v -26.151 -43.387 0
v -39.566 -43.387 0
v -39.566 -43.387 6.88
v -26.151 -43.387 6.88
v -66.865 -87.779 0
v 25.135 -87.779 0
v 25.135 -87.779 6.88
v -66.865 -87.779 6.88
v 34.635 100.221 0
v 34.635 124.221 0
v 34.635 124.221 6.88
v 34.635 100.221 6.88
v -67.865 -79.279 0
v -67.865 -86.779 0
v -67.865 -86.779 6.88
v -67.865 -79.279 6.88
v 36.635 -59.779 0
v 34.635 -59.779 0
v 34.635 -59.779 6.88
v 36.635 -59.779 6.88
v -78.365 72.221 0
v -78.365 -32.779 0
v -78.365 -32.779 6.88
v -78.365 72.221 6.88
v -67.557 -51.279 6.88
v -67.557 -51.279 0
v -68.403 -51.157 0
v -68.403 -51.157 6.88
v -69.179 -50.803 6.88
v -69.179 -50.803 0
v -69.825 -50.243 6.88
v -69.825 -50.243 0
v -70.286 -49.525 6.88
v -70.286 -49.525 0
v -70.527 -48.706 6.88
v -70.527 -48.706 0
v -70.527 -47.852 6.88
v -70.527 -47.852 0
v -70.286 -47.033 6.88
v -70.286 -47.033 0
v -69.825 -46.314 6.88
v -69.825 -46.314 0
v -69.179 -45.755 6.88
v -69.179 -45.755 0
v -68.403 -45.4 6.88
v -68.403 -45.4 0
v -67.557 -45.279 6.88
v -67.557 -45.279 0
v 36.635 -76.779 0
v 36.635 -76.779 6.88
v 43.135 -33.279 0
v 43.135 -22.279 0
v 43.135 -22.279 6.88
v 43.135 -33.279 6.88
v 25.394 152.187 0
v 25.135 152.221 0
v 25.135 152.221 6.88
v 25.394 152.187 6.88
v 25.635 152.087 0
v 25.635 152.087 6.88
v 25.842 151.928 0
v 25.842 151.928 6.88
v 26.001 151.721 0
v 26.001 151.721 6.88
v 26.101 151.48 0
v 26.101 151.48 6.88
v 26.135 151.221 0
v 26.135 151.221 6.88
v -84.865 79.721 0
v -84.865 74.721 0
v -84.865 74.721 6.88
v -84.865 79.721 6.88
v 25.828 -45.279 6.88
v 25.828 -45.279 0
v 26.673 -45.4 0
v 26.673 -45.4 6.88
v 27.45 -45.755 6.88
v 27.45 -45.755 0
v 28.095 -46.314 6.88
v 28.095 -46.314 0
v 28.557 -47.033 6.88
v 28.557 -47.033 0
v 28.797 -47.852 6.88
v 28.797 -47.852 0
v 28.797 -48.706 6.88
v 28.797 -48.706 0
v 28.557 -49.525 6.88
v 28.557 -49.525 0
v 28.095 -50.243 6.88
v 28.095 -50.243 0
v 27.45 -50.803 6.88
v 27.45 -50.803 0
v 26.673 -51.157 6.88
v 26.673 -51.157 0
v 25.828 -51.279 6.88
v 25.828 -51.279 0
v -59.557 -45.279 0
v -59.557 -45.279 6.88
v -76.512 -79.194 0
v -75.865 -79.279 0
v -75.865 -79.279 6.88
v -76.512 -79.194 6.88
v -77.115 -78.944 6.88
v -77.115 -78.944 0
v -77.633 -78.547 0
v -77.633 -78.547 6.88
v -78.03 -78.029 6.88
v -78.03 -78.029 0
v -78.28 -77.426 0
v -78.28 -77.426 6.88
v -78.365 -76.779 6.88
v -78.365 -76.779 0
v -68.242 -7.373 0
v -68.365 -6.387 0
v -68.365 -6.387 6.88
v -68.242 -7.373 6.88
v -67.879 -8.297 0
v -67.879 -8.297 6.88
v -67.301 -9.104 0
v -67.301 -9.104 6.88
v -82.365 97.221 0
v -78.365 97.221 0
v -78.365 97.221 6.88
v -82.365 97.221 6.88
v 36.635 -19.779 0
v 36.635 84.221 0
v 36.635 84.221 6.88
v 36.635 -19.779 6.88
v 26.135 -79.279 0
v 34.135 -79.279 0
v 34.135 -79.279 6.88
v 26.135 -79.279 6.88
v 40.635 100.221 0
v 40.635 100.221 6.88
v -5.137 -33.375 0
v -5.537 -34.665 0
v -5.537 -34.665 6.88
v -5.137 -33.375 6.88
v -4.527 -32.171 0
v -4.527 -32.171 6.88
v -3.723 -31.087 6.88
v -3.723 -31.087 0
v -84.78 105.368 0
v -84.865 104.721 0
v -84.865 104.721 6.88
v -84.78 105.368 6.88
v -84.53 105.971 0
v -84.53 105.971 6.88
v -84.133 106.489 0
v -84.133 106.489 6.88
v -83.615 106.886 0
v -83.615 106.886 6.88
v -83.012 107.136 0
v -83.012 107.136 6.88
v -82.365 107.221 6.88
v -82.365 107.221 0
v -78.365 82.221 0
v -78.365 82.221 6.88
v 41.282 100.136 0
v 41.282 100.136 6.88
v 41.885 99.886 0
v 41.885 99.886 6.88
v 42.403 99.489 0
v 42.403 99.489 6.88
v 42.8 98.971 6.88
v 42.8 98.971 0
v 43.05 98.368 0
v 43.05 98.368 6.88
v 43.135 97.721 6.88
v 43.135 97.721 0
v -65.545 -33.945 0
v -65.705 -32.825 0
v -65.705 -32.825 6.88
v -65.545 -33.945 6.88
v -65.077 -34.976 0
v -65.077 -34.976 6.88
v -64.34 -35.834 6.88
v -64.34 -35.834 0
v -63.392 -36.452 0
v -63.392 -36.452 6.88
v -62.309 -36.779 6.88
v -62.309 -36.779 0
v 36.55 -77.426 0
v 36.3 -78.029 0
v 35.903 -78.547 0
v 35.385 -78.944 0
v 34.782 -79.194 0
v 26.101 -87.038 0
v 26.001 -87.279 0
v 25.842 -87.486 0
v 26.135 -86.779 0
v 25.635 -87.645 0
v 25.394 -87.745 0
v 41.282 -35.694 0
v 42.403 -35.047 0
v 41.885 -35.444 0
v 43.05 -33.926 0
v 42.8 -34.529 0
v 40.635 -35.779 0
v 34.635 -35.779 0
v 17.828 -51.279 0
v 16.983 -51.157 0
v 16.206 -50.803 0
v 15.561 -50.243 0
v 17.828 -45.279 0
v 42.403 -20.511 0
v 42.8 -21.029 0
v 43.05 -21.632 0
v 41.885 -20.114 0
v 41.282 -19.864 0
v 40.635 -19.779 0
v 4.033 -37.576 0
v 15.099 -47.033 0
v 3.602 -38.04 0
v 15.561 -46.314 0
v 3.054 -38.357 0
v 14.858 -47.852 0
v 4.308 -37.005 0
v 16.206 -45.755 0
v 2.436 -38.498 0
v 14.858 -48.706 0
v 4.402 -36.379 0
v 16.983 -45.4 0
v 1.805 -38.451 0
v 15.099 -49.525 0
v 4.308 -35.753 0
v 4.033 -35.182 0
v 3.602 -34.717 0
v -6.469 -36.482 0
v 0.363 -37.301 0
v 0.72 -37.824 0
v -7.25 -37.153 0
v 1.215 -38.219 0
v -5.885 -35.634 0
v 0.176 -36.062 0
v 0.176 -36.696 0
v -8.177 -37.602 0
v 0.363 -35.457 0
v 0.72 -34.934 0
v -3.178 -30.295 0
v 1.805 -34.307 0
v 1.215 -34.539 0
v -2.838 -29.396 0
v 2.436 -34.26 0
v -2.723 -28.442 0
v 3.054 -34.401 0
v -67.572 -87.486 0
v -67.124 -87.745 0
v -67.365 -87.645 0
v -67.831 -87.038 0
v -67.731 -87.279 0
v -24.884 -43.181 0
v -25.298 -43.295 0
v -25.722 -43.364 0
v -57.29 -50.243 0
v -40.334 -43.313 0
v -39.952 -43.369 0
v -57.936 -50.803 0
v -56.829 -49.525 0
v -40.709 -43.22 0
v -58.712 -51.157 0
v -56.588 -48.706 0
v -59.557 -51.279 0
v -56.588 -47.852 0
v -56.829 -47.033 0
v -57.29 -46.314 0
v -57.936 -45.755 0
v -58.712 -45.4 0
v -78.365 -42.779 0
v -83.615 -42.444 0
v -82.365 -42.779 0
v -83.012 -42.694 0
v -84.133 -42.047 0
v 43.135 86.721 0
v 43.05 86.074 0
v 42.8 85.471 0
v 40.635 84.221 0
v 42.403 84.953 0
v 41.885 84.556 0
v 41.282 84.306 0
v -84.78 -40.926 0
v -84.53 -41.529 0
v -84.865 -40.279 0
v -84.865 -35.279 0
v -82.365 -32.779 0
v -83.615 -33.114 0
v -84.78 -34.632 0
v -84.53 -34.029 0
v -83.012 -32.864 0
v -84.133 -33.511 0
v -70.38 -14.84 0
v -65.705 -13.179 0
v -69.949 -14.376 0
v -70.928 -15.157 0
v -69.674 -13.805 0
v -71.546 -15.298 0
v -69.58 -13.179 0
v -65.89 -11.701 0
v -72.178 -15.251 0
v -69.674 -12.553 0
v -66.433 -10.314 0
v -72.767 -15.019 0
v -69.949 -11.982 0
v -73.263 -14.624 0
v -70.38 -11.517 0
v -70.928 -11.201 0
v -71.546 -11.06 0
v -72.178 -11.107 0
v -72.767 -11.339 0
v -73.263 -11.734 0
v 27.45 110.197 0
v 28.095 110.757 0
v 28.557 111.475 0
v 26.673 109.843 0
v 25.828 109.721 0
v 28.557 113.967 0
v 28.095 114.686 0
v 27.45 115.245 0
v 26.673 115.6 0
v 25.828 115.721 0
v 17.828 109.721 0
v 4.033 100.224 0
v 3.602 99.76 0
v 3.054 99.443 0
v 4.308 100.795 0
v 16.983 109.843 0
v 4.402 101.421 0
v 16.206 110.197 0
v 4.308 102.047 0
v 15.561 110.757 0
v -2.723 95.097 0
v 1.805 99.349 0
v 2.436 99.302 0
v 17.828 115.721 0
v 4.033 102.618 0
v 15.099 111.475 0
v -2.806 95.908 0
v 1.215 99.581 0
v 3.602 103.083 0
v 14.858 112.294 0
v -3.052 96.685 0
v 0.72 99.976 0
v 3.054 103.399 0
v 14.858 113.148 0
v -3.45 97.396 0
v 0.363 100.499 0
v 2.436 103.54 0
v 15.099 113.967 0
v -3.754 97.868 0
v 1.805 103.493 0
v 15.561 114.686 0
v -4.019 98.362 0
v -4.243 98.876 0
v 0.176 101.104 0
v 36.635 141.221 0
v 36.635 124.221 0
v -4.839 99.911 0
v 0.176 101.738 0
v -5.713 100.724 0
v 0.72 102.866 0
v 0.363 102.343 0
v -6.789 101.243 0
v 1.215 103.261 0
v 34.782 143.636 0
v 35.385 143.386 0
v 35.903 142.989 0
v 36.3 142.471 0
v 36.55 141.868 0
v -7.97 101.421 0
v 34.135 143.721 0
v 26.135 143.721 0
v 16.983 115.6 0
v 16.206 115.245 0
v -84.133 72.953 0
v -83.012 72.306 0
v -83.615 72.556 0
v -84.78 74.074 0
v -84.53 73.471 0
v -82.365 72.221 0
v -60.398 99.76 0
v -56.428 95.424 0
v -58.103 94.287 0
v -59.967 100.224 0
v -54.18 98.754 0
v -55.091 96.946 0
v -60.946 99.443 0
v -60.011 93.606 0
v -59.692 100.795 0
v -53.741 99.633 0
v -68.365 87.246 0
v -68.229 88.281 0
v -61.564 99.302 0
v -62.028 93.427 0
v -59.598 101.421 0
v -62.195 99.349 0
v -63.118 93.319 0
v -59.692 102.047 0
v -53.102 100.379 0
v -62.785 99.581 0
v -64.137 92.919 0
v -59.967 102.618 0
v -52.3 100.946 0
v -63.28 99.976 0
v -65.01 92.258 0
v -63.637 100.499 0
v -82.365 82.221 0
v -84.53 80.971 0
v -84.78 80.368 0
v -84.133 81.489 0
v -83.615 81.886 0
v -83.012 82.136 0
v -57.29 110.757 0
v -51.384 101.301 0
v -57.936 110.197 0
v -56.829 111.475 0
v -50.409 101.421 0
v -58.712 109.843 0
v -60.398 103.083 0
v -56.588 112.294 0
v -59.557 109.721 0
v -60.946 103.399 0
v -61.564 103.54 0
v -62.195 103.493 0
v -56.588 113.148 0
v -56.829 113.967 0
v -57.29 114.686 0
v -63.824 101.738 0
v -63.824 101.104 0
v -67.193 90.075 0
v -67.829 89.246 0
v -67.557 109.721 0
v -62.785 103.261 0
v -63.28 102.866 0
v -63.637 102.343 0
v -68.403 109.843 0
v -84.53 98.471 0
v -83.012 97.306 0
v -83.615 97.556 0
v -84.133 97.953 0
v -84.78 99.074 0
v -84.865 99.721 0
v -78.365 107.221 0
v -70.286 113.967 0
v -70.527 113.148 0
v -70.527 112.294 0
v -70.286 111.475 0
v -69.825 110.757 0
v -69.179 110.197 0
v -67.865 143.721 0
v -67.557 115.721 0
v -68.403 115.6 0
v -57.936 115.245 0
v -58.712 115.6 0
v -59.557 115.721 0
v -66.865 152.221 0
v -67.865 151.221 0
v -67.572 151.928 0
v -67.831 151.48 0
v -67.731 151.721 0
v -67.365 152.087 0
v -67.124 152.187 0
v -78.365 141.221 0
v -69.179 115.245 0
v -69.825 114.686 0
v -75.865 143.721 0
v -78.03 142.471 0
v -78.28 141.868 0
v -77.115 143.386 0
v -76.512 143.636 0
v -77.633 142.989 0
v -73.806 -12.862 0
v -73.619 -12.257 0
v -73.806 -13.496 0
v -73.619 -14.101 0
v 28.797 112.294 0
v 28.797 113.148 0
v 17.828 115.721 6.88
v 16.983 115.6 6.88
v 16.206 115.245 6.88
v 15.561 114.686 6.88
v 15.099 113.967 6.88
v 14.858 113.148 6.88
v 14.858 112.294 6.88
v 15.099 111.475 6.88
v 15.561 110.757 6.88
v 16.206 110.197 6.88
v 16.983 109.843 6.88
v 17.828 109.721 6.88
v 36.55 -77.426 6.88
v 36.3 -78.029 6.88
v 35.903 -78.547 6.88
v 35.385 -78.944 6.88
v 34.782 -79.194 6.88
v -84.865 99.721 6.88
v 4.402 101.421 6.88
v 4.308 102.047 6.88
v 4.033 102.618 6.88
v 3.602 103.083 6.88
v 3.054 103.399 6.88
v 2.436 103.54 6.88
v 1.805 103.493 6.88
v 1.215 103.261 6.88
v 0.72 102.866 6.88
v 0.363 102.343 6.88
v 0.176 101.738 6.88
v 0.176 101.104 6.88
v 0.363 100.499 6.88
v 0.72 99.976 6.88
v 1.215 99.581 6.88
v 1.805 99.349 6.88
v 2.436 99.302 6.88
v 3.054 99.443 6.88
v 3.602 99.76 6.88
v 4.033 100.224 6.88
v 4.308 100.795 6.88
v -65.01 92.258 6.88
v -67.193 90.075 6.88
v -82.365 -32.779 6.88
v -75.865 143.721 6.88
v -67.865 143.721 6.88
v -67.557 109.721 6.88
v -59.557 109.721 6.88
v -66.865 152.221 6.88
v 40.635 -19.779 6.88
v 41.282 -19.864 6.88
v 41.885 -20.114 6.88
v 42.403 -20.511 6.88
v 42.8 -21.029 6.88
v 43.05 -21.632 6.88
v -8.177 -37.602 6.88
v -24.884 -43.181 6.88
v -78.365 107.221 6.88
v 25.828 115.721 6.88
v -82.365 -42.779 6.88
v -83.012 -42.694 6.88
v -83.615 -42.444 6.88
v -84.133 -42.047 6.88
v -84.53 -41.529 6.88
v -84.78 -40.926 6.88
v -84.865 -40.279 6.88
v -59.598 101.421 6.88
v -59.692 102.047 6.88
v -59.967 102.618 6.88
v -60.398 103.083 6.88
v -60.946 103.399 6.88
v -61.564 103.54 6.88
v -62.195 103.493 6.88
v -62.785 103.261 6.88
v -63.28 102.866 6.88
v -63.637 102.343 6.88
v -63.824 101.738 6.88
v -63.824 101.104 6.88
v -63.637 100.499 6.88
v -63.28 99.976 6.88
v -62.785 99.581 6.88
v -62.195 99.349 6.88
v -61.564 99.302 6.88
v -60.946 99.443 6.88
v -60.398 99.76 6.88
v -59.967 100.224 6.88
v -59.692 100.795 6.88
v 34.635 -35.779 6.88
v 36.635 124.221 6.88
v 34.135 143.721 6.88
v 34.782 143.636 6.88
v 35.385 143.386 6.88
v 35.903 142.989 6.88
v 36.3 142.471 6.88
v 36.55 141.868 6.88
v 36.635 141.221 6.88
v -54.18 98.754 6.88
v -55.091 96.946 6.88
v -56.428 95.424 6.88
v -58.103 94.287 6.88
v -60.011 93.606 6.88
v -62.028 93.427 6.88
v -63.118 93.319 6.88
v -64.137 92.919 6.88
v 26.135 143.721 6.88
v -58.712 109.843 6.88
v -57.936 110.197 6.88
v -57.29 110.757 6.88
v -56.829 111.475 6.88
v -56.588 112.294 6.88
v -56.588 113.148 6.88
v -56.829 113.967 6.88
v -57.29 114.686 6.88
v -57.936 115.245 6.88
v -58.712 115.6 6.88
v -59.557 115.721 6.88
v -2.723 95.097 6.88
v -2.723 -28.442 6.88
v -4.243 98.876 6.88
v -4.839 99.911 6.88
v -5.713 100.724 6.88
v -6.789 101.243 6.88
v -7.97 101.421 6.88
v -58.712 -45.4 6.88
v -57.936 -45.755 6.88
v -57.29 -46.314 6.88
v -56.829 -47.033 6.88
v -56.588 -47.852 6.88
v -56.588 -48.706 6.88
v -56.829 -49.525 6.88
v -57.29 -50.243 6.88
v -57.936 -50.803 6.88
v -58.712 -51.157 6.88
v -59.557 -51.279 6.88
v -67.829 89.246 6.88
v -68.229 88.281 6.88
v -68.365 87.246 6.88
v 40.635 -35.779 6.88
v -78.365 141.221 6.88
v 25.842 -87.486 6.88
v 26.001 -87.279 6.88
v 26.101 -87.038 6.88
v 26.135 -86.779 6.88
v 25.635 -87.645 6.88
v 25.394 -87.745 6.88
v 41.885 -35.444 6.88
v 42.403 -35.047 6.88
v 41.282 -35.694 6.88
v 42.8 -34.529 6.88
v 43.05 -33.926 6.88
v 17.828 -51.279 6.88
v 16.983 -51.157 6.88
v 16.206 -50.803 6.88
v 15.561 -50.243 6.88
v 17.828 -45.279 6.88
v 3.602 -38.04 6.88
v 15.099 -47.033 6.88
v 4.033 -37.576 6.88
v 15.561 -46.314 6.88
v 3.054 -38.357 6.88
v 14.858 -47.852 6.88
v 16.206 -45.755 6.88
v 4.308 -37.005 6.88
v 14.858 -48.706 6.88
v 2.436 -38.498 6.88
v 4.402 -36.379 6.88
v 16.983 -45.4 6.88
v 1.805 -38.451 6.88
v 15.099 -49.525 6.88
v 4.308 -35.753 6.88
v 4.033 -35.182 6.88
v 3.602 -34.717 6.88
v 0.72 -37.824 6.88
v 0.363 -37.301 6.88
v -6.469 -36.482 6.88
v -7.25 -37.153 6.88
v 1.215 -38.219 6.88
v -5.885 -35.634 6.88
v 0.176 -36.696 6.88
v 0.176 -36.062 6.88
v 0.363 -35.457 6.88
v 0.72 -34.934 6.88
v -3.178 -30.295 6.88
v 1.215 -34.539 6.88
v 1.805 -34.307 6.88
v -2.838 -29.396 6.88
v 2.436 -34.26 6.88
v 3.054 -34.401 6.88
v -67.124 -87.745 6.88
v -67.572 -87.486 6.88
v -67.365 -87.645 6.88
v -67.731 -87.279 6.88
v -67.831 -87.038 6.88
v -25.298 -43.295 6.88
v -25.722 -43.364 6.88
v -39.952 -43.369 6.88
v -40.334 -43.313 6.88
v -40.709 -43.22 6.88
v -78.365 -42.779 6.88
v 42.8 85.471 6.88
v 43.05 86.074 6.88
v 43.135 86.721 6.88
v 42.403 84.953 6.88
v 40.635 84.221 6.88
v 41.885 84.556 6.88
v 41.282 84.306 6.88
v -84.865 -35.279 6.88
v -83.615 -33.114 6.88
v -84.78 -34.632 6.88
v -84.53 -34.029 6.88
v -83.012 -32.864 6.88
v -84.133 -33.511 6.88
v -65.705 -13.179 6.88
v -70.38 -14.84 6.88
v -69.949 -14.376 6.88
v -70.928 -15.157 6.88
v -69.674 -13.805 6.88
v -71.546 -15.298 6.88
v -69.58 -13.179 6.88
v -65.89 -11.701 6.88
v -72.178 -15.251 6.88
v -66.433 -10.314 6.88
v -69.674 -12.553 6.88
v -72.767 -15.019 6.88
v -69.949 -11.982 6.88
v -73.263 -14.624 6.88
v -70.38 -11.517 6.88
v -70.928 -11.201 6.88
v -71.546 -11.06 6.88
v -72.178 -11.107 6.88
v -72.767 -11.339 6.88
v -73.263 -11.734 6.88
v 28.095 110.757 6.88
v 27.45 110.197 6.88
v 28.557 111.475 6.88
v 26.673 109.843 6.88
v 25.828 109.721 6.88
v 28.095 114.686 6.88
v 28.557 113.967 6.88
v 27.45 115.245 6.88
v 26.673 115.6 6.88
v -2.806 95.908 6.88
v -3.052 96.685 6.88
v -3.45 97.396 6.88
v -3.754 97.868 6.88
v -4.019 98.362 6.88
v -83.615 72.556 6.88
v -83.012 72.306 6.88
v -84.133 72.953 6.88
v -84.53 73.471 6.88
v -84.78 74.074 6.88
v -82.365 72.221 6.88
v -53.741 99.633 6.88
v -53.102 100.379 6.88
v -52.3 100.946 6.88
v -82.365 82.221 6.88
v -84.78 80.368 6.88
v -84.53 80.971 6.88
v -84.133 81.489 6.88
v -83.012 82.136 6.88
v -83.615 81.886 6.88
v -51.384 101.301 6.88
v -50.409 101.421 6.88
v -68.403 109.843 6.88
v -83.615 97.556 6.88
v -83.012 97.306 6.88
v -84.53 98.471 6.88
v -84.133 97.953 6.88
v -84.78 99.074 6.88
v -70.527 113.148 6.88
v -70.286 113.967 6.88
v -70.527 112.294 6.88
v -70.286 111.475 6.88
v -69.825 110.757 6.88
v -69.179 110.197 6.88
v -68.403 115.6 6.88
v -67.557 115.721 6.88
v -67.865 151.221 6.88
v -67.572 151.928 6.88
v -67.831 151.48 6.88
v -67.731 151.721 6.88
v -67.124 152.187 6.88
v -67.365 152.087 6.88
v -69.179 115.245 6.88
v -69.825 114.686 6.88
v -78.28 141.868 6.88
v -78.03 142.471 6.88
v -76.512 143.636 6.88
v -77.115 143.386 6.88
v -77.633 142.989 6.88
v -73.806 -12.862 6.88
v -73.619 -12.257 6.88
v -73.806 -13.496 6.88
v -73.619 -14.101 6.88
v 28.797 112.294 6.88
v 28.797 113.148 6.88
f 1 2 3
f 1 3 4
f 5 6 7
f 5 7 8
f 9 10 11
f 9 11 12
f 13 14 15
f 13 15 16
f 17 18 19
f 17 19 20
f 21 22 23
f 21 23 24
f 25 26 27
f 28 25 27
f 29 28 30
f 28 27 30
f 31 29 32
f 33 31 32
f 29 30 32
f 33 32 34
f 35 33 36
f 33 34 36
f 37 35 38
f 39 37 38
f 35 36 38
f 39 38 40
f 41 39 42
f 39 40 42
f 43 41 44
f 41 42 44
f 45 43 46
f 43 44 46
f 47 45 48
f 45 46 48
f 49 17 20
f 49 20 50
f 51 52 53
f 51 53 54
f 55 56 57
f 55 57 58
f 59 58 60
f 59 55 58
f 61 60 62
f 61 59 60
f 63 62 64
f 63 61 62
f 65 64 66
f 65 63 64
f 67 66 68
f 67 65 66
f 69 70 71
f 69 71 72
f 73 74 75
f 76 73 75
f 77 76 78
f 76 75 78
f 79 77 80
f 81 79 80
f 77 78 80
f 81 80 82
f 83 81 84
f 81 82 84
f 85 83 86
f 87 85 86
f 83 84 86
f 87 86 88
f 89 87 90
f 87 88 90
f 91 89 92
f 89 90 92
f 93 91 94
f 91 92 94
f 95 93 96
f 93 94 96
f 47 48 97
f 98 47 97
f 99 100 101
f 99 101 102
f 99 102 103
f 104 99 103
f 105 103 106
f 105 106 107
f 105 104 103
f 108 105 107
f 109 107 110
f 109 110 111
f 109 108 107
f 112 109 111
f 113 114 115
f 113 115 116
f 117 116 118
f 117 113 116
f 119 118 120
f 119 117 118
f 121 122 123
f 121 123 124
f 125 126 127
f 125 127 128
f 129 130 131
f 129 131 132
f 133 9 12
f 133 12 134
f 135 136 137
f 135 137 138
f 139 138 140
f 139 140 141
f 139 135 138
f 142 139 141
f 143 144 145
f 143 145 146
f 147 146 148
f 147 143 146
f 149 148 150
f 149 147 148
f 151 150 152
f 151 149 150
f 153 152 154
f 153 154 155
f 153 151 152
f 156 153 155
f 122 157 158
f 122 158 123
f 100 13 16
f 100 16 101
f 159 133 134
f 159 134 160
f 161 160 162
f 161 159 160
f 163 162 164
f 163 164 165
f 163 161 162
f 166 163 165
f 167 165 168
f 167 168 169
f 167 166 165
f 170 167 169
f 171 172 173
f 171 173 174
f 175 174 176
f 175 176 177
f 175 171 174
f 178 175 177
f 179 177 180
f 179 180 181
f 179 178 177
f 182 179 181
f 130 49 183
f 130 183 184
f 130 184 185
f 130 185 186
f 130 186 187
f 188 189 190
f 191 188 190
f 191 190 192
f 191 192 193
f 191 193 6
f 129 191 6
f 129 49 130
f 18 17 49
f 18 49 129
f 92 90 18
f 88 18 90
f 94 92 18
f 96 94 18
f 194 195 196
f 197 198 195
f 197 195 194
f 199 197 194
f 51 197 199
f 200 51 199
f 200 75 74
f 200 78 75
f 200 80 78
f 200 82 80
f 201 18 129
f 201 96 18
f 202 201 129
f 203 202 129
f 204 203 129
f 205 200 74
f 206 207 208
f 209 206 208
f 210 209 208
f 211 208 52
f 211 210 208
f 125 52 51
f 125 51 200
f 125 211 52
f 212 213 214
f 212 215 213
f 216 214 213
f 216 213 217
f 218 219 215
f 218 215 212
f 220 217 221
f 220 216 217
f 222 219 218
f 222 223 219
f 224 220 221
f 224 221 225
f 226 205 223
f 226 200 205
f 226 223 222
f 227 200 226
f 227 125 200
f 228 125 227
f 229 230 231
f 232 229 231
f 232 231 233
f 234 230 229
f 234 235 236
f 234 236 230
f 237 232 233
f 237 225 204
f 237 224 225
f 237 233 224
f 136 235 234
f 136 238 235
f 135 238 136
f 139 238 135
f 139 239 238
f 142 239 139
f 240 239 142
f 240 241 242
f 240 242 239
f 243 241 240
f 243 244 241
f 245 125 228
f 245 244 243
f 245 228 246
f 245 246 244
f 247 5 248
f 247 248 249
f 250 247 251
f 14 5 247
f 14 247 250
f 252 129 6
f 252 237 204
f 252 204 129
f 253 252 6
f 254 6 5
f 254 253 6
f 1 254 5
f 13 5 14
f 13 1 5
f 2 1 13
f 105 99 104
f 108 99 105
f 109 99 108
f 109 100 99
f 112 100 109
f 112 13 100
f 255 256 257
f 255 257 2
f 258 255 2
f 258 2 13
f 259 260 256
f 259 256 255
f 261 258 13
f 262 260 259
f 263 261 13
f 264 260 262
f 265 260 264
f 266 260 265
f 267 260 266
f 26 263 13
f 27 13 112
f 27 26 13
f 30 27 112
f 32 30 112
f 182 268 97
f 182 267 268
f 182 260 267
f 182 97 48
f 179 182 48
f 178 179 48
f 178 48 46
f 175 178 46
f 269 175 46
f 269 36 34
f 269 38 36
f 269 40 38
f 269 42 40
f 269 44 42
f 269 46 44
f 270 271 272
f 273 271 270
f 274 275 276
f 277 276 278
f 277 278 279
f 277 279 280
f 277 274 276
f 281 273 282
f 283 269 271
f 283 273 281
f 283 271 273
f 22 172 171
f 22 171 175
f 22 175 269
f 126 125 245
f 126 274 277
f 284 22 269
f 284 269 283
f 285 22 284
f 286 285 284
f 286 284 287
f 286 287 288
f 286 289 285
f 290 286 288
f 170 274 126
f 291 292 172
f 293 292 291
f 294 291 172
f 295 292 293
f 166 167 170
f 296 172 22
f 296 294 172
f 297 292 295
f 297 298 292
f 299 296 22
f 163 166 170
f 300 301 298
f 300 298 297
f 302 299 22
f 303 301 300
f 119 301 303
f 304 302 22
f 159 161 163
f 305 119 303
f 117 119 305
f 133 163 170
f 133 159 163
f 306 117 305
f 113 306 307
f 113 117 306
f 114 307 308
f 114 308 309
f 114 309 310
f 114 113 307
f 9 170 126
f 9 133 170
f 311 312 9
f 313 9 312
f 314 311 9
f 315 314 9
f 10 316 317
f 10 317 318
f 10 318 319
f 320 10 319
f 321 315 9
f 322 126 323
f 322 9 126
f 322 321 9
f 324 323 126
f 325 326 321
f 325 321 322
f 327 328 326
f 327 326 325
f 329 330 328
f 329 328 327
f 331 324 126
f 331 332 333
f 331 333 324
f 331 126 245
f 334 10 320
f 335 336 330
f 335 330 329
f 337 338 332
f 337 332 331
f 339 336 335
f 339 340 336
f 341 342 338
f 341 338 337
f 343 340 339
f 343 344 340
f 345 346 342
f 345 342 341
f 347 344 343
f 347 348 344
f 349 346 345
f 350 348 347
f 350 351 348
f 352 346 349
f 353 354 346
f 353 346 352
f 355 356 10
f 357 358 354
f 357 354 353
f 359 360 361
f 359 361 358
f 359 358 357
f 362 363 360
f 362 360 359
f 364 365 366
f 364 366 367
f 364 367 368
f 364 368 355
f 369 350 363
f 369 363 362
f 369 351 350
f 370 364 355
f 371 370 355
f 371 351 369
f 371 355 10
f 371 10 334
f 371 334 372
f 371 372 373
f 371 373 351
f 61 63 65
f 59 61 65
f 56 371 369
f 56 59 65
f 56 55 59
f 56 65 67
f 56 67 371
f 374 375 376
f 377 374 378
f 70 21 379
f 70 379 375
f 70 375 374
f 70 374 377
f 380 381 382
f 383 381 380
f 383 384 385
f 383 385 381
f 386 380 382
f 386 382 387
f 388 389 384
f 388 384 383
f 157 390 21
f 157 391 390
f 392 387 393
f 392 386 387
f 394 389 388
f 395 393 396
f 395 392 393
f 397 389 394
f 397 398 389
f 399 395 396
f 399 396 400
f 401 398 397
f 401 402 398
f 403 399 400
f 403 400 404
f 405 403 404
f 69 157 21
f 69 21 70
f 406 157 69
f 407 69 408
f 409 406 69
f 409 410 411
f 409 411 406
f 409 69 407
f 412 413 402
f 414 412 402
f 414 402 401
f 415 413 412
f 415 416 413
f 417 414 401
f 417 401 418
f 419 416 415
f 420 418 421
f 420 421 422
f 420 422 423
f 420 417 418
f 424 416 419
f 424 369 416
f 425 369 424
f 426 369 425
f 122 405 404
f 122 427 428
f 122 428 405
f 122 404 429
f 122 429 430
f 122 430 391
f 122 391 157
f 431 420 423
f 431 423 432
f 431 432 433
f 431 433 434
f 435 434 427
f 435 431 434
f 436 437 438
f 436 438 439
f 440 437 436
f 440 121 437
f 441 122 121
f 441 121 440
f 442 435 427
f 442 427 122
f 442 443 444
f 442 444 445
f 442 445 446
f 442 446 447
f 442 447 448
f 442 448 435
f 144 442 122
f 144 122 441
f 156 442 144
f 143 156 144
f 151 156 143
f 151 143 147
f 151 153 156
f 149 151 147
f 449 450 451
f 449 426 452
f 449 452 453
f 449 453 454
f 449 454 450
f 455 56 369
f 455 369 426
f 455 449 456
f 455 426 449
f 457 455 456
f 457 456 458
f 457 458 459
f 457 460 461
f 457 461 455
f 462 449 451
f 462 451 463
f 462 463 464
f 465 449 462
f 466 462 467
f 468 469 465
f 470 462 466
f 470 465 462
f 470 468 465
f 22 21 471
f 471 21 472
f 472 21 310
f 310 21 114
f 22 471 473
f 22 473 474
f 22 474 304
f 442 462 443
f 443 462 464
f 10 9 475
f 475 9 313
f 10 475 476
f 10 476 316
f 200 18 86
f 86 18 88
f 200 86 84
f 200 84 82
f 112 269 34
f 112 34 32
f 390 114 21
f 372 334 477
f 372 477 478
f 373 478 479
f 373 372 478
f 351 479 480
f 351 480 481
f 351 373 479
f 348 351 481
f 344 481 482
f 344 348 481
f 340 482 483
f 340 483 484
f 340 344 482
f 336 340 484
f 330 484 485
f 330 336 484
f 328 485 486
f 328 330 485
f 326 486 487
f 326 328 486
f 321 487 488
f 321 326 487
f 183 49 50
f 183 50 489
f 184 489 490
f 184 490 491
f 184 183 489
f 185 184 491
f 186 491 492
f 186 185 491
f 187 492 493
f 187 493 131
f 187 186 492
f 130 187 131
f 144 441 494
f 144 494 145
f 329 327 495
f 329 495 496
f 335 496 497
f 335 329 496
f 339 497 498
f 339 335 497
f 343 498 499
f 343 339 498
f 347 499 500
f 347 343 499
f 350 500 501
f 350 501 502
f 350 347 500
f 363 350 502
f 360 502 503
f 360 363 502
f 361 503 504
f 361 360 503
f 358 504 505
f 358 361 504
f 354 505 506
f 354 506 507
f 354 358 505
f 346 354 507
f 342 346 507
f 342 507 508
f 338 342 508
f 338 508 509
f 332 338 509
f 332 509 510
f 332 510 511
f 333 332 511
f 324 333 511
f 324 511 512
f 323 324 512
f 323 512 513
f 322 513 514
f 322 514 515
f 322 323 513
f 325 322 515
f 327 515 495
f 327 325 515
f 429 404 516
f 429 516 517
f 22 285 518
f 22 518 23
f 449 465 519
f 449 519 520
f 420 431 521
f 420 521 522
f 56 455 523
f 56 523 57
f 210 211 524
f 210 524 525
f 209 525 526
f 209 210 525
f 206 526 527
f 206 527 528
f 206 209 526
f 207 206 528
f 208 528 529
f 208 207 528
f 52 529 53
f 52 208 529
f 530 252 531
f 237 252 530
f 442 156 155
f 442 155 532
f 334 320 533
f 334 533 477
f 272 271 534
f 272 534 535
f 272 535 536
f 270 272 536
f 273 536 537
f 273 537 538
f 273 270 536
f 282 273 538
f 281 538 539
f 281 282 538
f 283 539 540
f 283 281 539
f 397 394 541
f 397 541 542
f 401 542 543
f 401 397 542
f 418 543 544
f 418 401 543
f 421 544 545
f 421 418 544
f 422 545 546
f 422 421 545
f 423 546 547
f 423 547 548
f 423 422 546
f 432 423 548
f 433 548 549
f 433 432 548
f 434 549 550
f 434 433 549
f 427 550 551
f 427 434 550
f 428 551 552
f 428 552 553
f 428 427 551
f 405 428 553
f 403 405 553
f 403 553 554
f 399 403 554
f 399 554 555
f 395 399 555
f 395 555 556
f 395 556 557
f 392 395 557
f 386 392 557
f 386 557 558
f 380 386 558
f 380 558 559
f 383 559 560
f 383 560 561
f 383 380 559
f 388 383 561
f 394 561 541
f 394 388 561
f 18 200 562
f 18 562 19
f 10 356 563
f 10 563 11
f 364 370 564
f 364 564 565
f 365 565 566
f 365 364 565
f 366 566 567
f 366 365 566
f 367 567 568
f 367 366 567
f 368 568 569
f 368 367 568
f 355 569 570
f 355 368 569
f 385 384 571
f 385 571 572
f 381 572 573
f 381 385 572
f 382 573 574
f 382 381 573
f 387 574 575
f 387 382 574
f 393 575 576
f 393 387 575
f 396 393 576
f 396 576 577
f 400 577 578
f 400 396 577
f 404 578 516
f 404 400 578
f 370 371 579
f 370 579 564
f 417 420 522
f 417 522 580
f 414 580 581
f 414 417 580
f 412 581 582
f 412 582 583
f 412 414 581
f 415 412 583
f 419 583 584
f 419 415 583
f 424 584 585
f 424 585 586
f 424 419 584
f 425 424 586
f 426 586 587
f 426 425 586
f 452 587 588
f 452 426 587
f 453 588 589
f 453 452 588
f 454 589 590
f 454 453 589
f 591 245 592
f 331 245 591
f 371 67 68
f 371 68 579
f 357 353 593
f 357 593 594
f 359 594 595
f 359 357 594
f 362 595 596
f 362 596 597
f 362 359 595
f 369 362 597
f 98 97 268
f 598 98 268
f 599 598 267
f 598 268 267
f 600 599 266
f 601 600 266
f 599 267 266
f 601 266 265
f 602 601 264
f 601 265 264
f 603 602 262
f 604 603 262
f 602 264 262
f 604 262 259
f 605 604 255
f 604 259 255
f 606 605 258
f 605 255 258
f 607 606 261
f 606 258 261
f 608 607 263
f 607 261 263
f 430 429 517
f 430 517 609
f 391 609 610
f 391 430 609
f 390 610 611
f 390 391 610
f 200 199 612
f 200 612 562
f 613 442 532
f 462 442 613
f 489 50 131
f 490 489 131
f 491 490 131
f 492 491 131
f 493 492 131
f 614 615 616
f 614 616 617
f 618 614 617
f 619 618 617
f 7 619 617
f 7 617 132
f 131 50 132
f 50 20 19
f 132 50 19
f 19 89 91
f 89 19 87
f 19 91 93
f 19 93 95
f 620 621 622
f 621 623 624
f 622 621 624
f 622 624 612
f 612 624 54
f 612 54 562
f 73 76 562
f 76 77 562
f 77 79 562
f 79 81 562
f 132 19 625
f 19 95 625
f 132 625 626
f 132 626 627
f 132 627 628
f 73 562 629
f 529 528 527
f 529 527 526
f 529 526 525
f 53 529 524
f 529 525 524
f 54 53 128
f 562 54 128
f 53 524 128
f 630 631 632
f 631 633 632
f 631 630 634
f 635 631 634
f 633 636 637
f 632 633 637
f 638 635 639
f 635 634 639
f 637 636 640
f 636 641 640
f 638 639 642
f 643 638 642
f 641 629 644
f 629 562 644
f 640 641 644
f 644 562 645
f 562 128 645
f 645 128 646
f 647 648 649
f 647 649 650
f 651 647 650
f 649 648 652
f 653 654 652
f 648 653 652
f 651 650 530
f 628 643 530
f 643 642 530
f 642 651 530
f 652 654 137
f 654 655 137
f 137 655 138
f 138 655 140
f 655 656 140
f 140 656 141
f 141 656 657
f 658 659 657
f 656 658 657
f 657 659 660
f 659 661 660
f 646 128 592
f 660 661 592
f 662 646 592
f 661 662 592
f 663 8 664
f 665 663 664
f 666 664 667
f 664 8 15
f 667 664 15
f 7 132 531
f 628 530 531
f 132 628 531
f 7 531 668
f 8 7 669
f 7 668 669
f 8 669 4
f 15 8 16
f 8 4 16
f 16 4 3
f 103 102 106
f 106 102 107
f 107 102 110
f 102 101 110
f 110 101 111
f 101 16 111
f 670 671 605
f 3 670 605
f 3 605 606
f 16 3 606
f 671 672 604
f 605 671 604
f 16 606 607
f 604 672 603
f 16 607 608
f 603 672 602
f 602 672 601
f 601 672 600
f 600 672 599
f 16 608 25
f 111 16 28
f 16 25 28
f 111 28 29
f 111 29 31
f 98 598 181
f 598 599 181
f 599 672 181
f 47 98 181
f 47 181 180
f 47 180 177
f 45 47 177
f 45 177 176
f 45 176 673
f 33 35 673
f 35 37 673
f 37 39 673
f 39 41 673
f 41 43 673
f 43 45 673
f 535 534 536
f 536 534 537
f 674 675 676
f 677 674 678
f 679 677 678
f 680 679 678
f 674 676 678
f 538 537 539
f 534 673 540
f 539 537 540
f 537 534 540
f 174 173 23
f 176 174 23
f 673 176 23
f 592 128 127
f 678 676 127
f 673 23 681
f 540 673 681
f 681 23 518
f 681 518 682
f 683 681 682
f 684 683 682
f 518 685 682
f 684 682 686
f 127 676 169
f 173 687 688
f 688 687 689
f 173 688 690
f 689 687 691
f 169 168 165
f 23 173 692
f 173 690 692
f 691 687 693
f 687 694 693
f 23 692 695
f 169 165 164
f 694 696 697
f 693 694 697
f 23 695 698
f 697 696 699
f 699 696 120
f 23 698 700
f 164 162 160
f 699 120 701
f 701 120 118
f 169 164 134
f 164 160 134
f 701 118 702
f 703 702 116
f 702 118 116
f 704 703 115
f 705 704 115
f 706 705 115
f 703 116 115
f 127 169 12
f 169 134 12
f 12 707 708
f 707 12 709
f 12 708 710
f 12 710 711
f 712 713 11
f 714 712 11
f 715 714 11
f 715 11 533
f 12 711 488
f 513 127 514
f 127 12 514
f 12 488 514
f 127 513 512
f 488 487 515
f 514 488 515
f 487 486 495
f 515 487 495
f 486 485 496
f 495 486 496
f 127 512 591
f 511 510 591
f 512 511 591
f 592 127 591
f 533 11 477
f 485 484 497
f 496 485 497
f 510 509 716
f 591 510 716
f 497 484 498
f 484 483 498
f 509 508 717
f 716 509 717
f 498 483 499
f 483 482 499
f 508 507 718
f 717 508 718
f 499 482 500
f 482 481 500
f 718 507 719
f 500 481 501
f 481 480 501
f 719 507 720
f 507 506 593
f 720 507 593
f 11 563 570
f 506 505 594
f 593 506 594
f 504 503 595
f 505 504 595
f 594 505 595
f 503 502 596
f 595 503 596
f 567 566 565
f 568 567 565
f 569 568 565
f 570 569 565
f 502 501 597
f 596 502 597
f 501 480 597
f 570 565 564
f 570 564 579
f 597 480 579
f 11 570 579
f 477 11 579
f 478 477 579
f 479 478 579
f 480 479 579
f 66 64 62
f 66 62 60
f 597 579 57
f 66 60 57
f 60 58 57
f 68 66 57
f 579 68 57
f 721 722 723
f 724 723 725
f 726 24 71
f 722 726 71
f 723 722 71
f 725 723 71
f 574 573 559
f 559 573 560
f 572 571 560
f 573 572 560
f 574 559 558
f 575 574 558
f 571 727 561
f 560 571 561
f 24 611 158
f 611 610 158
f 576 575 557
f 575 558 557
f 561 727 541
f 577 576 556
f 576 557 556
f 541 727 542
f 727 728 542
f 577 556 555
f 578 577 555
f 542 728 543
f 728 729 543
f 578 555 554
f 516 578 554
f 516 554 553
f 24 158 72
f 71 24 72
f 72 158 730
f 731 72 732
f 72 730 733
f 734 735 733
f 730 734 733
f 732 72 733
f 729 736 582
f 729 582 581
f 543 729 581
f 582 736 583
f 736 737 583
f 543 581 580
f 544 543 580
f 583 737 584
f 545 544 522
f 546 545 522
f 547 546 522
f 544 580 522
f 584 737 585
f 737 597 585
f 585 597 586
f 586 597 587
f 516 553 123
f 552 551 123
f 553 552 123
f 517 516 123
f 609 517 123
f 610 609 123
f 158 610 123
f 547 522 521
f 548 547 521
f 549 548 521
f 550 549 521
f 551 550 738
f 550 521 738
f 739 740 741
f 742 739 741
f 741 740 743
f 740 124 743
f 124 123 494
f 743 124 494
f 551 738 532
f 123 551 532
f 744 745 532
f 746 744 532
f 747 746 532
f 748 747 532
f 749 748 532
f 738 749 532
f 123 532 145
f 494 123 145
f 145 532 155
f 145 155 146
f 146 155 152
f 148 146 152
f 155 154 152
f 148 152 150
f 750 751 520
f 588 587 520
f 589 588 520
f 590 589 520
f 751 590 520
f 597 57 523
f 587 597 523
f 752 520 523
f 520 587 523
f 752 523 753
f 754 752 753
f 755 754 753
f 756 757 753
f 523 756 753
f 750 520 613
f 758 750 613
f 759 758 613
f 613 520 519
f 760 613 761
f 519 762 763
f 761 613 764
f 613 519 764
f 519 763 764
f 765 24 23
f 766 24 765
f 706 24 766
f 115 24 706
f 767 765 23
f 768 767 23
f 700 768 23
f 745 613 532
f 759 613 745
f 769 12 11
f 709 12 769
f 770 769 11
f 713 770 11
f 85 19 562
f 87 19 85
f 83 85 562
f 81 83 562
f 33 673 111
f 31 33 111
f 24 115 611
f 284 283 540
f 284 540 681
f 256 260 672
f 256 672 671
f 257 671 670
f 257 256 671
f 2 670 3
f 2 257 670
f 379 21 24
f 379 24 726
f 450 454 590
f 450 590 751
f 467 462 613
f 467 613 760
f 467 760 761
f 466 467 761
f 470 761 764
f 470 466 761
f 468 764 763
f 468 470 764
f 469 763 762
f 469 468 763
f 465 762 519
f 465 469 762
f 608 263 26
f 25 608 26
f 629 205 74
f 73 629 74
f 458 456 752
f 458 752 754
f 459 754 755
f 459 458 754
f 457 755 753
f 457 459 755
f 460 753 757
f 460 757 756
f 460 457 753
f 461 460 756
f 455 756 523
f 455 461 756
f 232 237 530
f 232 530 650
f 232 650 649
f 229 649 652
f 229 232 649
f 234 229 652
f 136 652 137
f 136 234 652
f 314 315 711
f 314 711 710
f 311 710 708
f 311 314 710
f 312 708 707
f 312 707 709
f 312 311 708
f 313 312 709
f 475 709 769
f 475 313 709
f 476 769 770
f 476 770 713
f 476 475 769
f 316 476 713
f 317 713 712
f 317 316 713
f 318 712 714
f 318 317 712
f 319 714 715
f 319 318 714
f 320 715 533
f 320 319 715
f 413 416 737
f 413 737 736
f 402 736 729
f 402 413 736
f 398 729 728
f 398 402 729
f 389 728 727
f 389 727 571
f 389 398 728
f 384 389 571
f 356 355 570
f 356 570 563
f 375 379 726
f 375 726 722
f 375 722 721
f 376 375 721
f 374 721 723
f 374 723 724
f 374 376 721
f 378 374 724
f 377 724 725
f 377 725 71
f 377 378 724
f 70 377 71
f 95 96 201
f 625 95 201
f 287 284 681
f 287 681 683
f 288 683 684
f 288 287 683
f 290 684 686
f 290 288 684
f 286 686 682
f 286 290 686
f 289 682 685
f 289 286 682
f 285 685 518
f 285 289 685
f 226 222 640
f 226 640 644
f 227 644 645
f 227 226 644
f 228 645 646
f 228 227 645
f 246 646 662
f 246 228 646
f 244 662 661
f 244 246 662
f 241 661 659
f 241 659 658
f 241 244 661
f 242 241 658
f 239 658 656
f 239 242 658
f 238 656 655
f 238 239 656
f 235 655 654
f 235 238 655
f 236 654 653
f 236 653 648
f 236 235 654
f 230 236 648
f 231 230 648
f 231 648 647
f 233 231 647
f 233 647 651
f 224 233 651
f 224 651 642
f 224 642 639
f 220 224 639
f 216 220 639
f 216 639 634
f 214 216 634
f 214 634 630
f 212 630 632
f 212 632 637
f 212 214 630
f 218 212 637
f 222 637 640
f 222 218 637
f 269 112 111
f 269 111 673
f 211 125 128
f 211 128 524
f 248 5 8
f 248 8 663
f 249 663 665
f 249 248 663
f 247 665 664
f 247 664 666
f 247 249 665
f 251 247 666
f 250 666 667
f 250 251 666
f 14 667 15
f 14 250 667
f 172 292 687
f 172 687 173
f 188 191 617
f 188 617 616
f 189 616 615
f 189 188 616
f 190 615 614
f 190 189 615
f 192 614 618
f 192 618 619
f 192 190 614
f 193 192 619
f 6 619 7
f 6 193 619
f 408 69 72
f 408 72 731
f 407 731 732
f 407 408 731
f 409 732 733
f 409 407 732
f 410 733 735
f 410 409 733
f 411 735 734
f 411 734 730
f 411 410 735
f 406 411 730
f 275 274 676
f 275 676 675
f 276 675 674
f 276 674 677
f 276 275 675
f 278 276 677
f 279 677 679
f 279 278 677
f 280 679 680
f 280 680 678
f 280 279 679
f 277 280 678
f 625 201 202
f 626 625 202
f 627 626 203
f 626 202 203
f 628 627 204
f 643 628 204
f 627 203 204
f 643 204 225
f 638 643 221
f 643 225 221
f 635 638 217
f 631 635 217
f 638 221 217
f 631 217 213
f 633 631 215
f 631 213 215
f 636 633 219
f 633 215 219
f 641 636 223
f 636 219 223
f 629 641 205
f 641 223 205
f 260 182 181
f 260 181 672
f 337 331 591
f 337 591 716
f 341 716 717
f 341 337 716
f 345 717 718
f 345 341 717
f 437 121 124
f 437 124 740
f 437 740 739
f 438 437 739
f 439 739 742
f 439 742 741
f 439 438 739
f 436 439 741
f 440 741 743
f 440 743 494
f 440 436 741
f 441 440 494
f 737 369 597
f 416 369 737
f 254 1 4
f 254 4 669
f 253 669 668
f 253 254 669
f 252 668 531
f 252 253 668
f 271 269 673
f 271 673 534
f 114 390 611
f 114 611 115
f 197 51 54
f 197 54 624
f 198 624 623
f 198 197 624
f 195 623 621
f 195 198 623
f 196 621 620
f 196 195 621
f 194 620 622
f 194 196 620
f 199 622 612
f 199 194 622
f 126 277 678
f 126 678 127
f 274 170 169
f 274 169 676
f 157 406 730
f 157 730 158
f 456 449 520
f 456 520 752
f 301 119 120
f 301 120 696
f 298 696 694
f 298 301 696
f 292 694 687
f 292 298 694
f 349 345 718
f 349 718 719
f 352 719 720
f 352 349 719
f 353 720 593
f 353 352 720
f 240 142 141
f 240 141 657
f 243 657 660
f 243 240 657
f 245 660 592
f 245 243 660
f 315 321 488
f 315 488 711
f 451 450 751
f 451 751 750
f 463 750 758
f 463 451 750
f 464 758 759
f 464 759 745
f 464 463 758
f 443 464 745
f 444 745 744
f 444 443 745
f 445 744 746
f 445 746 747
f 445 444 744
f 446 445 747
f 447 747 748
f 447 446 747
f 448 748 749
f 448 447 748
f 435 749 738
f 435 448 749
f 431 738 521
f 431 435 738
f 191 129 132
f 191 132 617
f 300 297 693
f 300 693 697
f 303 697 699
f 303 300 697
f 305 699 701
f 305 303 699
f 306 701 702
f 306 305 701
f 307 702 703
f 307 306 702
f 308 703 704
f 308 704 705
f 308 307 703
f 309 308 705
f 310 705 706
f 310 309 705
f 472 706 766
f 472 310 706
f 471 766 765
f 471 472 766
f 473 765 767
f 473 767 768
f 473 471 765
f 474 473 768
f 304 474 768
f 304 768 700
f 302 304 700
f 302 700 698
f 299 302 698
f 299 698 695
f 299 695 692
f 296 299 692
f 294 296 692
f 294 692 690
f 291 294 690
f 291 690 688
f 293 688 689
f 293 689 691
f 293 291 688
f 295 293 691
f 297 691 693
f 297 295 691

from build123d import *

# Parameters (mm, degrees)
SKETCH1_R           = 2.125
BOSS_EXTRUDE1_DEPTH = 6.88


with BuildPart() as part:
    # Sketch1 → Boss-Extrude1 (new body)
    with BuildSketch(Plane.XY):
        with BuildLine():
            Line((-78.364802088, -42.778869258), (-82.364802088, -42.778869258))
            ThreePointArc((-82.364802088, -42.778869258), (-84.132569041, -42.046636211), (-84.864802088, -40.278869258))
            Line((-84.864802088, -40.278869258), (-84.864802088, -35.278869258))
            ThreePointArc((-84.864802088, -35.278869258), (-84.132569041, -33.511102306), (-82.364802088, -32.778869258))
            Line((-82.364802088, -32.778869258), (-78.364802088, -32.778869258))
            Line((-78.364802088, -32.778869258), (-78.364802088, 72.221130742))
            Line((-78.364802088, 72.221130742), (-82.364802088, 72.221130742))
            ThreePointArc((-82.364802088, 72.221130742), (-84.132569041, 72.953363789), (-84.864802088, 74.721130742))
            Line((-84.864802088, 74.721130742), (-84.864802088, 79.721130742))
            ThreePointArc((-84.864802088, 79.721130742), (-84.132569041, 81.488897694), (-82.364802088, 82.221130742))
            Line((-82.364802088, 82.221130742), (-78.364802088, 82.221130742))
            Line((-78.364802088, 82.221130742), (-78.364802088, 97.221130742))
            Line((-78.364802088, 97.221130742), (-82.364802088, 97.221130742))
            ThreePointArc((-82.364802088, 97.221130742), (-84.132569041, 97.953363789), (-84.864802088, 99.721130742))
            Line((-84.864802088, 99.721130742), (-84.864802088, 104.721130742))
            ThreePointArc((-84.864802088, 104.721130742), (-84.132569041, 106.488897694), (-82.364802088, 107.221130742))
            Line((-82.364802088, 107.221130742), (-78.364802088, 107.221130742))
            Line((-78.364802088, 107.221130742), (-78.364802088, 141.221127314))
            ThreePointArc((-78.364802088, 141.221127314), (-77.632570253, 142.988896483), (-75.864802088, 143.721130742))
            Line((-75.864802088, 143.721130742), (-67.864802088, 143.721130742))
            Line((-67.864802088, 143.721130742), (-67.864802088, 151.221130742))
            ThreePointArc((-67.864802088, 151.221130742), (-67.571908869, 151.928237523), (-66.864802088, 152.221130742))
            Line((-66.864802088, 152.221130742), (25.135197912, 152.221130742))
            ThreePointArc((25.135197912, 152.221130742), (25.842304693, 151.928237523), (26.135197912, 151.221130742))
            Line((26.135197912, 151.221130742), (26.135197912, 143.721130742))
            Line((26.135197912, 143.721130742), (34.135197912, 143.721130742))
            ThreePointArc((34.135197912, 143.721130742), (35.902964865, 142.988897694), (36.635197912, 141.221130742))
            Line((36.635197912, 141.221130742), (36.635197912, 124.221130742))
            Line((36.635197912, 124.221130742), (34.635197912, 124.221130742))
            Line((34.635197912, 124.221130742), (34.635197912, 100.221130742))
            Line((34.635197912, 100.221130742), (40.635197912, 100.221130742))
            ThreePointArc((40.635197912, 100.221130742), (42.402964865, 99.488897694), (43.135197912, 97.721130742))
            Line((43.135197912, 97.721130742), (43.135197912, 86.721130742))
            ThreePointArc((43.135197912, 86.721130742), (42.402964865, 84.953363789), (40.635197912, 84.221130742))
            Line((40.635197912, 84.221130742), (36.635197912, 84.221130742))
            Line((36.635197912, 84.221130742), (36.635197912, -19.778869258))
            Line((36.635197912, -19.778869258), (40.635197912, -19.778869258))
            ThreePointArc((40.635197912, -19.778869258), (42.402964865, -20.511102306), (43.135197912, -22.278869258))
            Line((43.135197912, -22.278869258), (43.135197912, -33.278869258))
            ThreePointArc((43.135197912, -33.278869258), (42.402964865, -35.046636211), (40.635197912, -35.778869258))
            Line((40.635197912, -35.778869258), (34.635197912, -35.778869258))
            Line((34.635197912, -35.778869258), (34.635197912, -59.778869258))
            Line((34.635197912, -59.778869258), (36.635197912, -59.778869258))
            Line((36.635197912, -59.778869258), (36.635197912, -76.778869258))
            ThreePointArc((36.635197912, -76.778869258), (35.902964865, -78.546636211), (34.135197912, -79.278869258))
            Line((34.135197912, -79.278869258), (26.135197912, -79.278869258))
            Line((26.135197912, -79.278869258), (26.135197912, -86.778869258))
            ThreePointArc((26.135197912, -86.778869258), (25.842304693, -87.48597604), (25.135197912, -87.778869258))
            Line((25.135197912, -87.778869258), (-66.864802088, -87.778869258))
            ThreePointArc((-66.864802088, -87.778869258), (-67.571908869, -87.48597604), (-67.864802088, -86.778869258))
            Line((-67.864802088, -86.778869258), (-67.864802088, -79.278869258))
            Line((-67.864802088, -79.278869258), (-75.864802088, -79.278869258))
            ThreePointArc((-75.864802088, -79.278869258), (-77.632569041, -78.546636211), (-78.364802088, -76.778869258))
            Line((-78.364802088, -76.778869258), (-78.364802088, -42.778869258))
        make_face()
        with Locations((-71.704802088, -13.178869258)):
            Circle(SKETCH1_R, mode=Mode.SUBTRACT)
        with Locations((2.277397912, 101.421130742)):
            Circle(SKETCH1_R, mode=Mode.SUBTRACT)
        with Locations((-61.722602088, 101.421130741)):
            Circle(SKETCH1_R, mode=Mode.SUBTRACT)
        with Locations((2.277397912, -36.378869258)):
            Circle(SKETCH1_R, mode=Mode.SUBTRACT)
        with BuildLine():
            Line((17.827855969, -45.278869258), (25.827855969, -45.278869258))
            ThreePointArc((25.827855969, -45.278869258), (28.827855969, -48.278869258), (25.827855969, -51.278869258))
            Line((25.827855969, -51.278869258), (17.827855969, -51.278869258))
            ThreePointArc((17.827855969, -51.278869258), (14.827855969, -48.278869258), (17.827855969, -45.278869258))
        make_face(mode=Mode.SUBTRACT)
        with BuildLine():
            Line((-65.704802088, -13.178869258), (-65.704802088, -32.824689972))
            ThreePointArc((-65.704802088, -32.824689972), (-64.73917528, -35.430947697), (-62.308512422, -36.778869258))
            Line((-62.308512422, -36.778869258), (-40.709388186, -43.22032523))
            ThreePointArc((-40.709388186, -43.22032523), (-40.143864213, -43.345228063), (-39.566230949, -43.387155324))
            Line((-39.566230949, -43.387155324), (-26.151305592, -43.387155324))
            ThreePointArc((-26.151305592, -43.387155324), (-25.50948768, -43.33532829), (-24.884301528, -43.181190208))
            Line((-24.884301528, -43.181190208), (-8.176926635, -37.601823511))
            ThreePointArc((-8.176926635, -37.601823511), (-6.469142152, -36.4818554), (-5.536821161, -34.664815504))
            ThreePointArc((-5.536821161, -34.664815504), (-4.857565105, -32.760540535), (-3.722602088, -31.087366636))
            ThreePointArc((-3.722602088, -31.087366636), (-2.980944701, -29.855828888), (-2.722602088, -28.441615325))
            Line((-2.722602088, -28.441615325), (-2.722602088, 95.096575421))
            ThreePointArc((-2.722602088, 95.096575421), (-2.908751731, 96.3026208), (-3.449874815, 97.396413719))
            ThreePointArc((-3.449874815, 97.396413719), (-3.891134752, 98.112172481), (-4.243388939, 98.875676196))
            ThreePointArc((-4.243388939, 98.875676196), (-5.713248555, 100.724022037), (-7.969552854, 101.421130741))
            Line((-7.969552854, 101.421130741), (-50.408893589, 101.421130741))
            ThreePointArc((-50.408893589, 101.421130741), (-52.718294666, 100.687117065), (-54.180129755, 98.754464075))
            ThreePointArc((-54.180129755, 98.754464075), (-57.229450027, 94.802098746), (-62.028259496, 93.426972027))
            ThreePointArc((-62.028259496, 93.426972027), (-63.640931937, 93.153984004), (-65.009515325, 92.258319795))
            Line((-65.009515325, 92.258319795), (-67.193229213, 90.074605907))
            ThreePointArc((-67.193229213, 90.074605907), (-68.060320218, 88.776912512), (-68.364802088, 87.246178782))
            Line((-68.364802088, 87.246178782), (-68.364802088, -6.387374578))
            ThreePointArc((-68.364802088, -6.387374578), (-68.089315479, -7.84614118), (-67.300802088, -9.10397245))
            ThreePointArc((-67.300802088, -9.10397245), (-66.118032001, -10.990719355), (-65.704802088, -13.178869258))
        make_face(mode=Mode.SUBTRACT)
        with BuildLine():
            Line((-67.557460145, 109.721130742), (-59.557460145, 109.721130742))
            ThreePointArc((-59.557460145, 109.721130742), (-56.557460145, 112.721130742), (-59.557460145, 115.721130742))
            Line((-59.557460145, 115.721130742), (-67.557460145, 115.721130742))
            ThreePointArc((-67.557460145, 115.721130742), (-70.557460145, 112.721130742), (-67.557460145, 109.721130742))
        make_face(mode=Mode.SUBTRACT)
        with BuildLine():
            Line((17.827855969, 109.721130742), (25.827855969, 109.721130742))
            ThreePointArc((25.827855969, 109.721130742), (28.827855969, 112.721130742), (25.827855969, 115.721130742))
            Line((25.827855969, 115.721130742), (17.827855969, 115.721130742))
            ThreePointArc((17.827855969, 115.721130742), (14.827855969, 112.721130742), (17.827855969, 109.721130742))
        make_face(mode=Mode.SUBTRACT)
        with BuildLine():
            Line((-67.557460145, -45.278869258), (-59.557460145, -45.278869258))
            ThreePointArc((-59.557460145, -45.278869258), (-56.557460145, -48.278869258), (-59.557460145, -51.278869258))
            Line((-59.557460145, -51.278869258), (-67.557460145, -51.278869258))
            ThreePointArc((-67.557460145, -51.278869258), (-70.557460145, -48.278869258), (-67.557460145, -45.278869258))
        make_face(mode=Mode.SUBTRACT)
    extrude(amount=BOSS_EXTRUDE1_DEPTH)


solid = part.part
